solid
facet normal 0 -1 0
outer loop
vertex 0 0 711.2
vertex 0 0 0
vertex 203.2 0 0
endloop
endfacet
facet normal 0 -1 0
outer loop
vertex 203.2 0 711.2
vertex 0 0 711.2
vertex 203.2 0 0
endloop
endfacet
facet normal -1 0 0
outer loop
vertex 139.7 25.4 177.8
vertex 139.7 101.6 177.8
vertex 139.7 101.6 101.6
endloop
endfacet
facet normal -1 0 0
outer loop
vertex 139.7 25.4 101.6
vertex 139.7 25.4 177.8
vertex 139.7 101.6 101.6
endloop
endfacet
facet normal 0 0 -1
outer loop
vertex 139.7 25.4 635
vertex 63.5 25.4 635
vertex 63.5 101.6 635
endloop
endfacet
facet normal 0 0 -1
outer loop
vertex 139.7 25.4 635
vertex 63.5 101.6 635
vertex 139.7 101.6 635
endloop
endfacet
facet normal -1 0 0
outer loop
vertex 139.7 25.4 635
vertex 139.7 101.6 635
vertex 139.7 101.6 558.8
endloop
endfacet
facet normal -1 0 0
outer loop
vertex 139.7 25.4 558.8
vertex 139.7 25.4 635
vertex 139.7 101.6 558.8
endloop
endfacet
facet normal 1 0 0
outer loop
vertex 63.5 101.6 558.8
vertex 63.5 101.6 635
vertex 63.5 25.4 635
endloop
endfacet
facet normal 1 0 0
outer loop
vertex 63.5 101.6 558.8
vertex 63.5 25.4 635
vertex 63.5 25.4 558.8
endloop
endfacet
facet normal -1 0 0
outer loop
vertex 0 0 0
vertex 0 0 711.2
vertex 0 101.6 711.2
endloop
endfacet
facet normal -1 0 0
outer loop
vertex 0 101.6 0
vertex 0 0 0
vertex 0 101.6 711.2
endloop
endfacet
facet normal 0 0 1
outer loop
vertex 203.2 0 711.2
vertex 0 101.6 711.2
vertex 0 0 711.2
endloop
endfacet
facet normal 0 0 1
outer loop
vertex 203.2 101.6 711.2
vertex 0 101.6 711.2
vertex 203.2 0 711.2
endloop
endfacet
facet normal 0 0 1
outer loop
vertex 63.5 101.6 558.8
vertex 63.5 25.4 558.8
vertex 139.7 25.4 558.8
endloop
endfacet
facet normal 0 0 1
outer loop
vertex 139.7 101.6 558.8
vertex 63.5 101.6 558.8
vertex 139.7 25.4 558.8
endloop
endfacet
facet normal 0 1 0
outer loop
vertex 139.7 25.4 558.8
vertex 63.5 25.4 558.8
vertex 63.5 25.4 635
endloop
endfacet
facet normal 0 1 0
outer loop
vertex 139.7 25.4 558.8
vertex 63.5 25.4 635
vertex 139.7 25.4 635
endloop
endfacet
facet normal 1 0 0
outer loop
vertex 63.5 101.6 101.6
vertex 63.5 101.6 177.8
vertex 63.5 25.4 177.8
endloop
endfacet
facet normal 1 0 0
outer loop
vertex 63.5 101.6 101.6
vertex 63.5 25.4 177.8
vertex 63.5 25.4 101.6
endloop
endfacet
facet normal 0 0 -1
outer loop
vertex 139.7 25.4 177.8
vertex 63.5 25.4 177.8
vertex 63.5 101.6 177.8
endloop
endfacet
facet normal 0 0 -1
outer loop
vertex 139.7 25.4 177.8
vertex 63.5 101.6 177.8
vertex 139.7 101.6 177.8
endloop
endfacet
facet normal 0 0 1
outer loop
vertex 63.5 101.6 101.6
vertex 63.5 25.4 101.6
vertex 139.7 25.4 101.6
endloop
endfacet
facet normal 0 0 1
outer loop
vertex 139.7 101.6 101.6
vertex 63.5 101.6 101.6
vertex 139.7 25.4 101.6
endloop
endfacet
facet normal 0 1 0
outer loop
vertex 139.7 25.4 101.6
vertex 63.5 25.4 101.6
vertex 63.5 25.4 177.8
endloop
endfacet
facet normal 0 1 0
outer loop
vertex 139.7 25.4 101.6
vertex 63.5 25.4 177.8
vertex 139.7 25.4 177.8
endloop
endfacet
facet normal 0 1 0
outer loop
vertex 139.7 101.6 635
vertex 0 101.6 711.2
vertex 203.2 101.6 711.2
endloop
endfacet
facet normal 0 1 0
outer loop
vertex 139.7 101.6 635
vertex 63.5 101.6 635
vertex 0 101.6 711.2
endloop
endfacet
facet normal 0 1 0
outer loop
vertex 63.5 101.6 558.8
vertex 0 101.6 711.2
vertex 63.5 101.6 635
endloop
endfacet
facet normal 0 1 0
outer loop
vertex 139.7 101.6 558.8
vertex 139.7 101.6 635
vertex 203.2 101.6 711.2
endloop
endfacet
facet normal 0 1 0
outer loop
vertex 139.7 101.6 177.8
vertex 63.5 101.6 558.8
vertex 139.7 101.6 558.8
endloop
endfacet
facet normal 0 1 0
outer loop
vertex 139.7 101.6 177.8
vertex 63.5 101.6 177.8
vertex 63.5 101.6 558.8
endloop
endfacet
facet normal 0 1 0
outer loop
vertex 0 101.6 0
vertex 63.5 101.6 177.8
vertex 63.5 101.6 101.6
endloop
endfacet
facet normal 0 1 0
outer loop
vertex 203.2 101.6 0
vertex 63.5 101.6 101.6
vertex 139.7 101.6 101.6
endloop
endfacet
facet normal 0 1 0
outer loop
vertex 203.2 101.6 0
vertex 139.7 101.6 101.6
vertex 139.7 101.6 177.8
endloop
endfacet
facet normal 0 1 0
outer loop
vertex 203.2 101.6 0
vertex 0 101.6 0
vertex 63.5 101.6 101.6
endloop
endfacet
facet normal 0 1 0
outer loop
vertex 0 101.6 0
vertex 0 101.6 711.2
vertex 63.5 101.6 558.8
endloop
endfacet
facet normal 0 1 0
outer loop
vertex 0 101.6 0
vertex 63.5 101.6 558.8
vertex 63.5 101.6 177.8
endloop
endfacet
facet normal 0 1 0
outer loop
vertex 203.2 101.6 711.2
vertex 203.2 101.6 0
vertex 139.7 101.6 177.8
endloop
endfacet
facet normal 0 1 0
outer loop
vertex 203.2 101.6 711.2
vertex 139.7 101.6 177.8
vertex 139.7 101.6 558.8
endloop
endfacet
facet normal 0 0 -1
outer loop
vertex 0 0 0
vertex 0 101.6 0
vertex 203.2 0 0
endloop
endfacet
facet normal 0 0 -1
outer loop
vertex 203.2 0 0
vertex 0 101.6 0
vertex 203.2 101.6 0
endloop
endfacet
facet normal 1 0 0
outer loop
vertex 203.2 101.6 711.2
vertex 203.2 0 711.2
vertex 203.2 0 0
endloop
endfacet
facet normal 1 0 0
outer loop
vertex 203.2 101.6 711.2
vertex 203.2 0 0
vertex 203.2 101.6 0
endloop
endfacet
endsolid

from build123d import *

# Parameters (mm, degrees)
SKETCH1_W           = 203.2
SKETCH1_H           = 101.6
BOSS_EXTRUDE1_DEPTH = 711.2
SKETCH2_W           = 76.2
SKETCH2_H           = 76.2
CUT_EXTRUDE1_DEPTH  = 76.2


with BuildPart() as part:
    # Sketch1 → Boss-Extrude1 (new body)
    with BuildSketch(Plane.XY):
        with Locations((101.6, 50.8)):
            Rectangle(SKETCH1_W, SKETCH1_H)
    extrude(amount=BOSS_EXTRUDE1_DEPTH)

    # Sketch2 → Cut-Extrude1 (cut)
    with BuildSketch(Plane(origin=(0, 101.6, 0), x_dir=(1, 0, 0), z_dir=(0, 1, 0))):
        with Locations((101.6, -139.7)):
            Rectangle(SKETCH2_W, SKETCH2_H)
        with Locations((101.6, -596.9)):
            Rectangle(SKETCH2_W, SKETCH2_H)
    extrude(amount=-CUT_EXTRUDE1_DEPTH, mode=Mode.SUBTRACT)


solid = part.part
